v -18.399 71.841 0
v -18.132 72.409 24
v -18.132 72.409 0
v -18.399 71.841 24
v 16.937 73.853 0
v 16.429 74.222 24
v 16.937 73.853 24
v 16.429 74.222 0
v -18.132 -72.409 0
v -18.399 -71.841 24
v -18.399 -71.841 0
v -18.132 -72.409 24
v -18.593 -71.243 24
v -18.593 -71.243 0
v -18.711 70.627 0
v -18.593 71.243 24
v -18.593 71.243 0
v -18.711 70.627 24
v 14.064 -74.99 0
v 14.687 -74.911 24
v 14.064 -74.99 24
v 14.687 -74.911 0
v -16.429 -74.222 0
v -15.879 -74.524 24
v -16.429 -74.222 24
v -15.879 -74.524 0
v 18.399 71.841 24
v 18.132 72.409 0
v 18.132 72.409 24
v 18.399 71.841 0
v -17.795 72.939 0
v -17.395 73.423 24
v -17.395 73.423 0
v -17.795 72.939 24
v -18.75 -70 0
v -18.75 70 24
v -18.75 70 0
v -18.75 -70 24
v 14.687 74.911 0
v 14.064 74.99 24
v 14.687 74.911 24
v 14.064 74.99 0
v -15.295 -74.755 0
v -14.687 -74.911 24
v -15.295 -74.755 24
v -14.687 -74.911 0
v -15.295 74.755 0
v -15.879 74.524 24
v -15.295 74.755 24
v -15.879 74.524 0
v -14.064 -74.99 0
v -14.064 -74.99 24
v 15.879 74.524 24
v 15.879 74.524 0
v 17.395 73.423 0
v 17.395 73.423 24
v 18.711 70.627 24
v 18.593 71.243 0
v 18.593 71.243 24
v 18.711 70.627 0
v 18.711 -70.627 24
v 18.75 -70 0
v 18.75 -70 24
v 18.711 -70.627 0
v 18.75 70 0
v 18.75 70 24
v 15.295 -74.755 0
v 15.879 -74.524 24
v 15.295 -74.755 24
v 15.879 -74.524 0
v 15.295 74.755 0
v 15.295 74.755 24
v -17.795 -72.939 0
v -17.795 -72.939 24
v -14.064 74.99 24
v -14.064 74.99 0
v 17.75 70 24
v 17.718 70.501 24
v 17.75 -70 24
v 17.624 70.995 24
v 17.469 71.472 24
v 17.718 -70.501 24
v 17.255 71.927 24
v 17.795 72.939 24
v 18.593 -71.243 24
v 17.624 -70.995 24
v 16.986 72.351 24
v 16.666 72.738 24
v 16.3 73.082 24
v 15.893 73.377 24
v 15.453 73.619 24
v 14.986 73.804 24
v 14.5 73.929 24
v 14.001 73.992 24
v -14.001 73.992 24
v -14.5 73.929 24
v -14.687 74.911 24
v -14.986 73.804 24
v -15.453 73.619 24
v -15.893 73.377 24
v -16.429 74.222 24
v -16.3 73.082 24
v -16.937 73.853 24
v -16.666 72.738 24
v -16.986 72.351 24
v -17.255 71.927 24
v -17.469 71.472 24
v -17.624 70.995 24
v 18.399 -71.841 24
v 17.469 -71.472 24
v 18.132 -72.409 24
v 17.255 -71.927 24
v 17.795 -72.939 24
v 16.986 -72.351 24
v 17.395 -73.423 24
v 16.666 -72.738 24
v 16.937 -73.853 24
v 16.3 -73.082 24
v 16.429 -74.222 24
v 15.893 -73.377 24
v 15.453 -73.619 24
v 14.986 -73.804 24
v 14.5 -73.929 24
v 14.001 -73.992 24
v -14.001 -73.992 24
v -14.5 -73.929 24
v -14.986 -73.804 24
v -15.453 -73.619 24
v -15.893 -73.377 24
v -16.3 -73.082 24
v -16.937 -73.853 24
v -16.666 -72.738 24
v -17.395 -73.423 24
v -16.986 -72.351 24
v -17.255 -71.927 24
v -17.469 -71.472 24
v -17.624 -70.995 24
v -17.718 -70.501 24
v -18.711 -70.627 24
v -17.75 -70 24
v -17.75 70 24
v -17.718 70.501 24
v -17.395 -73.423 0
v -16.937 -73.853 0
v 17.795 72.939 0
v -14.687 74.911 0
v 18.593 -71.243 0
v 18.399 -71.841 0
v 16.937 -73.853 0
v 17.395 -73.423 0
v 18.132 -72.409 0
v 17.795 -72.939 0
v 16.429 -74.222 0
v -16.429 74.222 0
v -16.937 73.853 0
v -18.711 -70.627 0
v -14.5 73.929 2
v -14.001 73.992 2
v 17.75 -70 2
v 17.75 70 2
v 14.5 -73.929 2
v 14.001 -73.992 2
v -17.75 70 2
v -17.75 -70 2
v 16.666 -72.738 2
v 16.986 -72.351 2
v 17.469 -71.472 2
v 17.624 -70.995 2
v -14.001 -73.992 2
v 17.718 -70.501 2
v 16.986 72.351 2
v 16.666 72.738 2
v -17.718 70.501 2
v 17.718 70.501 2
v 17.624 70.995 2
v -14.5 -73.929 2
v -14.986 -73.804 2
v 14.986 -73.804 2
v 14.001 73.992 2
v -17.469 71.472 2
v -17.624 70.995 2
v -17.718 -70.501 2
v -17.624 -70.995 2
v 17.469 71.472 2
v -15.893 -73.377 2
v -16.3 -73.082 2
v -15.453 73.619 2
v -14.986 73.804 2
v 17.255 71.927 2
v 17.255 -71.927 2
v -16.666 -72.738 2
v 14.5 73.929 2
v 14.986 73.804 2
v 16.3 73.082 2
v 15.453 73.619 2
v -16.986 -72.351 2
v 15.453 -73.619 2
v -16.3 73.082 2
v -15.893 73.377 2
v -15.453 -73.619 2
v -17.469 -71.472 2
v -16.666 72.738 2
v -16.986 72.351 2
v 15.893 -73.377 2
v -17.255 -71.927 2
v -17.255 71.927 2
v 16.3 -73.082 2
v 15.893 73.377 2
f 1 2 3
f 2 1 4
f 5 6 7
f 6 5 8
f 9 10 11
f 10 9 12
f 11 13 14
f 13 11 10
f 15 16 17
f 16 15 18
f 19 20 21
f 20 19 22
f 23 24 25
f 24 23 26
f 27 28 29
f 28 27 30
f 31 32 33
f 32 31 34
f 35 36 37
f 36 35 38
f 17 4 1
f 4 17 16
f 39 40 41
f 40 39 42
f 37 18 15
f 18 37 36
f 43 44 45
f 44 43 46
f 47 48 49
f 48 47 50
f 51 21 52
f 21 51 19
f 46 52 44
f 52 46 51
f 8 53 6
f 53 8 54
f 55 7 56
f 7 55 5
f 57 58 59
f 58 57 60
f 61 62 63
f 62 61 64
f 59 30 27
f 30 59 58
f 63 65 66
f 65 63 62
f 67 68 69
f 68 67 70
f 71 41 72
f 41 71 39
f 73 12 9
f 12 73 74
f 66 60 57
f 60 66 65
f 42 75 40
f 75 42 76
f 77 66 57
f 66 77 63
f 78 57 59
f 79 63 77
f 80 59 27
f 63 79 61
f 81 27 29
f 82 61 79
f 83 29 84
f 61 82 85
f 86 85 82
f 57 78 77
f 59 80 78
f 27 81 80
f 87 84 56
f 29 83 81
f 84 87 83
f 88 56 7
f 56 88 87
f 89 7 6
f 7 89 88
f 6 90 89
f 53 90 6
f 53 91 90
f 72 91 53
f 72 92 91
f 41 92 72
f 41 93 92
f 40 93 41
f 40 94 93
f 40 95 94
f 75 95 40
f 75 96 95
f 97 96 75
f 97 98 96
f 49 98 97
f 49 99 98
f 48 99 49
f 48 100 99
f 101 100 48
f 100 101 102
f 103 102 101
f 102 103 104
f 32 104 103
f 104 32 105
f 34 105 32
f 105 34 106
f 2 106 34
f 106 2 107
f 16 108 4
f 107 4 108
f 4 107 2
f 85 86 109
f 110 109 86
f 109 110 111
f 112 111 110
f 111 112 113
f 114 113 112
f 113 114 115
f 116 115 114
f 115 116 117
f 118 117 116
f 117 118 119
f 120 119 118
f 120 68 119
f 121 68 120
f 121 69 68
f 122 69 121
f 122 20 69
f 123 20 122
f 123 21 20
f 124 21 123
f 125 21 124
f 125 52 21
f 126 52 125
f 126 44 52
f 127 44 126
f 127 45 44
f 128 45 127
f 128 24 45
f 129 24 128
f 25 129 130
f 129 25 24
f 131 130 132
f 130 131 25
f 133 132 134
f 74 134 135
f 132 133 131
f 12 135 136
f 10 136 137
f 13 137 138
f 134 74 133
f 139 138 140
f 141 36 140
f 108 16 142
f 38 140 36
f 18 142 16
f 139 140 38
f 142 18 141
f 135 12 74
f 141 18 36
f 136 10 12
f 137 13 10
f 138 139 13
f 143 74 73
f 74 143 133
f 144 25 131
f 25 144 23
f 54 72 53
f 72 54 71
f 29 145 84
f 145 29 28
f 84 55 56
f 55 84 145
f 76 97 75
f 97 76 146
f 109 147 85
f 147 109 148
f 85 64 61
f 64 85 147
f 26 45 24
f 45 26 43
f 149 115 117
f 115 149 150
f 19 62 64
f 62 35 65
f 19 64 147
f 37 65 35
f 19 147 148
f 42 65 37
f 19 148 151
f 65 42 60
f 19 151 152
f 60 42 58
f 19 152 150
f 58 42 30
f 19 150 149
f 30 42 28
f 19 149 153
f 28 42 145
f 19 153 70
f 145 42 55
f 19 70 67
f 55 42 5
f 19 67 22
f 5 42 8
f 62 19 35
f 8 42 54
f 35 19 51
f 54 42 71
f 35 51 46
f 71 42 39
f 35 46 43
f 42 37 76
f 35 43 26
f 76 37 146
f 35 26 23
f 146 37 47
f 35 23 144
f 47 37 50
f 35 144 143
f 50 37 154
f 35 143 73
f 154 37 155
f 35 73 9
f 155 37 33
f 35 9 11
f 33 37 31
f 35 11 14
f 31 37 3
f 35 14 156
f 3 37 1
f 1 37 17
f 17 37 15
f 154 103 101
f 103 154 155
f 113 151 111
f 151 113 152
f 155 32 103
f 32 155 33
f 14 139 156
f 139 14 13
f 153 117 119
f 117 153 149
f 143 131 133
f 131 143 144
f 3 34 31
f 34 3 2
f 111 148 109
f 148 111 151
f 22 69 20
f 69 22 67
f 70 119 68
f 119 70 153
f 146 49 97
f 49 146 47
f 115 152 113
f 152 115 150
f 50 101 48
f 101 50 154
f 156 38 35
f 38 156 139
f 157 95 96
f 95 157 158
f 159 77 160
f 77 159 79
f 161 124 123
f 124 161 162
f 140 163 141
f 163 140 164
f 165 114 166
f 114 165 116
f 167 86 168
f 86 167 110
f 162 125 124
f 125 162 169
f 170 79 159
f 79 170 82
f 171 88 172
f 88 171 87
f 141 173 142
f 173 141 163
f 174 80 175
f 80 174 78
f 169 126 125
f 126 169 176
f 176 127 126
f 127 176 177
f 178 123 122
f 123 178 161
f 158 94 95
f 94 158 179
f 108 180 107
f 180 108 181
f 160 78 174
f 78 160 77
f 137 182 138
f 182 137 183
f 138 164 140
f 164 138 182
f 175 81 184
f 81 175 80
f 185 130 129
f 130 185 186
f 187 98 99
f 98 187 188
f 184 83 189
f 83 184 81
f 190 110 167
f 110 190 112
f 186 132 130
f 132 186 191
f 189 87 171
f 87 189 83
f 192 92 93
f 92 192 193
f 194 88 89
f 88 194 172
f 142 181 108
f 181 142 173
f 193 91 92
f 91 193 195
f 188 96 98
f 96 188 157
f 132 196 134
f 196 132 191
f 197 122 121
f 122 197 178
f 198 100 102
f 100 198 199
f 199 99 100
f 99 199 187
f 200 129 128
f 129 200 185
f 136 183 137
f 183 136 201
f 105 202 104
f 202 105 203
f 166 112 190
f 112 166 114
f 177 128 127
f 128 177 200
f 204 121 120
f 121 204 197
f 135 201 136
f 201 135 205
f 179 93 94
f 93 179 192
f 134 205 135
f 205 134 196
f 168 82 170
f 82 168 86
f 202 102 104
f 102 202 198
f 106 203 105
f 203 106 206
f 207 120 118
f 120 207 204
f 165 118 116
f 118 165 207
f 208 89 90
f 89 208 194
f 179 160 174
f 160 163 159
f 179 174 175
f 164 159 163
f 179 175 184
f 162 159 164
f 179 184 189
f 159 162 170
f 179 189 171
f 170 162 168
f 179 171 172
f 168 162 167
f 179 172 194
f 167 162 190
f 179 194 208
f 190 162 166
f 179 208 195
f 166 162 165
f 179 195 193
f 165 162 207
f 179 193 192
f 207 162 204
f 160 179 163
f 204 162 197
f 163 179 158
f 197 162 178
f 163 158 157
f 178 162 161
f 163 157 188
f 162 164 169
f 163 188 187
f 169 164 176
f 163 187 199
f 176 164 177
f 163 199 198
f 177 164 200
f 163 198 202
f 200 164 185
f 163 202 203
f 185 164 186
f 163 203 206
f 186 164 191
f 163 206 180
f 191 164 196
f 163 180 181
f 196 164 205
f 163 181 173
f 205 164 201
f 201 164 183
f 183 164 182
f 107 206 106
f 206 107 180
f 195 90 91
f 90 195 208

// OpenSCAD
$fn = 50;


difference() {
	union() {
		hull() {
			translate(v = [-13.7500000000, 70.0000000000, 0]) {
				cylinder(h = 24, r = 5);
			}
			translate(v = [13.7500000000, 70.0000000000, 0]) {
				cylinder(h = 24, r = 5);
			}
			translate(v = [-13.7500000000, -70.0000000000, 0]) {
				cylinder(h = 24, r = 5);
			}
			translate(v = [13.7500000000, -70.0000000000, 0]) {
				cylinder(h = 24, r = 5);
			}
		}
	}
	union() {
		translate(v = [0, 0, 2]) {
			hull() {
				translate(v = [-13.7500000000, 70.0000000000, 0]) {
					cylinder(h = 22, r = 4);
				}
				translate(v = [13.7500000000, 70.0000000000, 0]) {
					cylinder(h = 22, r = 4);
				}
				translate(v = [-13.7500000000, -70.0000000000, 0]) {
					cylinder(h = 22, r = 4);
				}
				translate(v = [13.7500000000, -70.0000000000, 0]) {
					cylinder(h = 22, r = 4);
				}
			}
		}
	}
}
